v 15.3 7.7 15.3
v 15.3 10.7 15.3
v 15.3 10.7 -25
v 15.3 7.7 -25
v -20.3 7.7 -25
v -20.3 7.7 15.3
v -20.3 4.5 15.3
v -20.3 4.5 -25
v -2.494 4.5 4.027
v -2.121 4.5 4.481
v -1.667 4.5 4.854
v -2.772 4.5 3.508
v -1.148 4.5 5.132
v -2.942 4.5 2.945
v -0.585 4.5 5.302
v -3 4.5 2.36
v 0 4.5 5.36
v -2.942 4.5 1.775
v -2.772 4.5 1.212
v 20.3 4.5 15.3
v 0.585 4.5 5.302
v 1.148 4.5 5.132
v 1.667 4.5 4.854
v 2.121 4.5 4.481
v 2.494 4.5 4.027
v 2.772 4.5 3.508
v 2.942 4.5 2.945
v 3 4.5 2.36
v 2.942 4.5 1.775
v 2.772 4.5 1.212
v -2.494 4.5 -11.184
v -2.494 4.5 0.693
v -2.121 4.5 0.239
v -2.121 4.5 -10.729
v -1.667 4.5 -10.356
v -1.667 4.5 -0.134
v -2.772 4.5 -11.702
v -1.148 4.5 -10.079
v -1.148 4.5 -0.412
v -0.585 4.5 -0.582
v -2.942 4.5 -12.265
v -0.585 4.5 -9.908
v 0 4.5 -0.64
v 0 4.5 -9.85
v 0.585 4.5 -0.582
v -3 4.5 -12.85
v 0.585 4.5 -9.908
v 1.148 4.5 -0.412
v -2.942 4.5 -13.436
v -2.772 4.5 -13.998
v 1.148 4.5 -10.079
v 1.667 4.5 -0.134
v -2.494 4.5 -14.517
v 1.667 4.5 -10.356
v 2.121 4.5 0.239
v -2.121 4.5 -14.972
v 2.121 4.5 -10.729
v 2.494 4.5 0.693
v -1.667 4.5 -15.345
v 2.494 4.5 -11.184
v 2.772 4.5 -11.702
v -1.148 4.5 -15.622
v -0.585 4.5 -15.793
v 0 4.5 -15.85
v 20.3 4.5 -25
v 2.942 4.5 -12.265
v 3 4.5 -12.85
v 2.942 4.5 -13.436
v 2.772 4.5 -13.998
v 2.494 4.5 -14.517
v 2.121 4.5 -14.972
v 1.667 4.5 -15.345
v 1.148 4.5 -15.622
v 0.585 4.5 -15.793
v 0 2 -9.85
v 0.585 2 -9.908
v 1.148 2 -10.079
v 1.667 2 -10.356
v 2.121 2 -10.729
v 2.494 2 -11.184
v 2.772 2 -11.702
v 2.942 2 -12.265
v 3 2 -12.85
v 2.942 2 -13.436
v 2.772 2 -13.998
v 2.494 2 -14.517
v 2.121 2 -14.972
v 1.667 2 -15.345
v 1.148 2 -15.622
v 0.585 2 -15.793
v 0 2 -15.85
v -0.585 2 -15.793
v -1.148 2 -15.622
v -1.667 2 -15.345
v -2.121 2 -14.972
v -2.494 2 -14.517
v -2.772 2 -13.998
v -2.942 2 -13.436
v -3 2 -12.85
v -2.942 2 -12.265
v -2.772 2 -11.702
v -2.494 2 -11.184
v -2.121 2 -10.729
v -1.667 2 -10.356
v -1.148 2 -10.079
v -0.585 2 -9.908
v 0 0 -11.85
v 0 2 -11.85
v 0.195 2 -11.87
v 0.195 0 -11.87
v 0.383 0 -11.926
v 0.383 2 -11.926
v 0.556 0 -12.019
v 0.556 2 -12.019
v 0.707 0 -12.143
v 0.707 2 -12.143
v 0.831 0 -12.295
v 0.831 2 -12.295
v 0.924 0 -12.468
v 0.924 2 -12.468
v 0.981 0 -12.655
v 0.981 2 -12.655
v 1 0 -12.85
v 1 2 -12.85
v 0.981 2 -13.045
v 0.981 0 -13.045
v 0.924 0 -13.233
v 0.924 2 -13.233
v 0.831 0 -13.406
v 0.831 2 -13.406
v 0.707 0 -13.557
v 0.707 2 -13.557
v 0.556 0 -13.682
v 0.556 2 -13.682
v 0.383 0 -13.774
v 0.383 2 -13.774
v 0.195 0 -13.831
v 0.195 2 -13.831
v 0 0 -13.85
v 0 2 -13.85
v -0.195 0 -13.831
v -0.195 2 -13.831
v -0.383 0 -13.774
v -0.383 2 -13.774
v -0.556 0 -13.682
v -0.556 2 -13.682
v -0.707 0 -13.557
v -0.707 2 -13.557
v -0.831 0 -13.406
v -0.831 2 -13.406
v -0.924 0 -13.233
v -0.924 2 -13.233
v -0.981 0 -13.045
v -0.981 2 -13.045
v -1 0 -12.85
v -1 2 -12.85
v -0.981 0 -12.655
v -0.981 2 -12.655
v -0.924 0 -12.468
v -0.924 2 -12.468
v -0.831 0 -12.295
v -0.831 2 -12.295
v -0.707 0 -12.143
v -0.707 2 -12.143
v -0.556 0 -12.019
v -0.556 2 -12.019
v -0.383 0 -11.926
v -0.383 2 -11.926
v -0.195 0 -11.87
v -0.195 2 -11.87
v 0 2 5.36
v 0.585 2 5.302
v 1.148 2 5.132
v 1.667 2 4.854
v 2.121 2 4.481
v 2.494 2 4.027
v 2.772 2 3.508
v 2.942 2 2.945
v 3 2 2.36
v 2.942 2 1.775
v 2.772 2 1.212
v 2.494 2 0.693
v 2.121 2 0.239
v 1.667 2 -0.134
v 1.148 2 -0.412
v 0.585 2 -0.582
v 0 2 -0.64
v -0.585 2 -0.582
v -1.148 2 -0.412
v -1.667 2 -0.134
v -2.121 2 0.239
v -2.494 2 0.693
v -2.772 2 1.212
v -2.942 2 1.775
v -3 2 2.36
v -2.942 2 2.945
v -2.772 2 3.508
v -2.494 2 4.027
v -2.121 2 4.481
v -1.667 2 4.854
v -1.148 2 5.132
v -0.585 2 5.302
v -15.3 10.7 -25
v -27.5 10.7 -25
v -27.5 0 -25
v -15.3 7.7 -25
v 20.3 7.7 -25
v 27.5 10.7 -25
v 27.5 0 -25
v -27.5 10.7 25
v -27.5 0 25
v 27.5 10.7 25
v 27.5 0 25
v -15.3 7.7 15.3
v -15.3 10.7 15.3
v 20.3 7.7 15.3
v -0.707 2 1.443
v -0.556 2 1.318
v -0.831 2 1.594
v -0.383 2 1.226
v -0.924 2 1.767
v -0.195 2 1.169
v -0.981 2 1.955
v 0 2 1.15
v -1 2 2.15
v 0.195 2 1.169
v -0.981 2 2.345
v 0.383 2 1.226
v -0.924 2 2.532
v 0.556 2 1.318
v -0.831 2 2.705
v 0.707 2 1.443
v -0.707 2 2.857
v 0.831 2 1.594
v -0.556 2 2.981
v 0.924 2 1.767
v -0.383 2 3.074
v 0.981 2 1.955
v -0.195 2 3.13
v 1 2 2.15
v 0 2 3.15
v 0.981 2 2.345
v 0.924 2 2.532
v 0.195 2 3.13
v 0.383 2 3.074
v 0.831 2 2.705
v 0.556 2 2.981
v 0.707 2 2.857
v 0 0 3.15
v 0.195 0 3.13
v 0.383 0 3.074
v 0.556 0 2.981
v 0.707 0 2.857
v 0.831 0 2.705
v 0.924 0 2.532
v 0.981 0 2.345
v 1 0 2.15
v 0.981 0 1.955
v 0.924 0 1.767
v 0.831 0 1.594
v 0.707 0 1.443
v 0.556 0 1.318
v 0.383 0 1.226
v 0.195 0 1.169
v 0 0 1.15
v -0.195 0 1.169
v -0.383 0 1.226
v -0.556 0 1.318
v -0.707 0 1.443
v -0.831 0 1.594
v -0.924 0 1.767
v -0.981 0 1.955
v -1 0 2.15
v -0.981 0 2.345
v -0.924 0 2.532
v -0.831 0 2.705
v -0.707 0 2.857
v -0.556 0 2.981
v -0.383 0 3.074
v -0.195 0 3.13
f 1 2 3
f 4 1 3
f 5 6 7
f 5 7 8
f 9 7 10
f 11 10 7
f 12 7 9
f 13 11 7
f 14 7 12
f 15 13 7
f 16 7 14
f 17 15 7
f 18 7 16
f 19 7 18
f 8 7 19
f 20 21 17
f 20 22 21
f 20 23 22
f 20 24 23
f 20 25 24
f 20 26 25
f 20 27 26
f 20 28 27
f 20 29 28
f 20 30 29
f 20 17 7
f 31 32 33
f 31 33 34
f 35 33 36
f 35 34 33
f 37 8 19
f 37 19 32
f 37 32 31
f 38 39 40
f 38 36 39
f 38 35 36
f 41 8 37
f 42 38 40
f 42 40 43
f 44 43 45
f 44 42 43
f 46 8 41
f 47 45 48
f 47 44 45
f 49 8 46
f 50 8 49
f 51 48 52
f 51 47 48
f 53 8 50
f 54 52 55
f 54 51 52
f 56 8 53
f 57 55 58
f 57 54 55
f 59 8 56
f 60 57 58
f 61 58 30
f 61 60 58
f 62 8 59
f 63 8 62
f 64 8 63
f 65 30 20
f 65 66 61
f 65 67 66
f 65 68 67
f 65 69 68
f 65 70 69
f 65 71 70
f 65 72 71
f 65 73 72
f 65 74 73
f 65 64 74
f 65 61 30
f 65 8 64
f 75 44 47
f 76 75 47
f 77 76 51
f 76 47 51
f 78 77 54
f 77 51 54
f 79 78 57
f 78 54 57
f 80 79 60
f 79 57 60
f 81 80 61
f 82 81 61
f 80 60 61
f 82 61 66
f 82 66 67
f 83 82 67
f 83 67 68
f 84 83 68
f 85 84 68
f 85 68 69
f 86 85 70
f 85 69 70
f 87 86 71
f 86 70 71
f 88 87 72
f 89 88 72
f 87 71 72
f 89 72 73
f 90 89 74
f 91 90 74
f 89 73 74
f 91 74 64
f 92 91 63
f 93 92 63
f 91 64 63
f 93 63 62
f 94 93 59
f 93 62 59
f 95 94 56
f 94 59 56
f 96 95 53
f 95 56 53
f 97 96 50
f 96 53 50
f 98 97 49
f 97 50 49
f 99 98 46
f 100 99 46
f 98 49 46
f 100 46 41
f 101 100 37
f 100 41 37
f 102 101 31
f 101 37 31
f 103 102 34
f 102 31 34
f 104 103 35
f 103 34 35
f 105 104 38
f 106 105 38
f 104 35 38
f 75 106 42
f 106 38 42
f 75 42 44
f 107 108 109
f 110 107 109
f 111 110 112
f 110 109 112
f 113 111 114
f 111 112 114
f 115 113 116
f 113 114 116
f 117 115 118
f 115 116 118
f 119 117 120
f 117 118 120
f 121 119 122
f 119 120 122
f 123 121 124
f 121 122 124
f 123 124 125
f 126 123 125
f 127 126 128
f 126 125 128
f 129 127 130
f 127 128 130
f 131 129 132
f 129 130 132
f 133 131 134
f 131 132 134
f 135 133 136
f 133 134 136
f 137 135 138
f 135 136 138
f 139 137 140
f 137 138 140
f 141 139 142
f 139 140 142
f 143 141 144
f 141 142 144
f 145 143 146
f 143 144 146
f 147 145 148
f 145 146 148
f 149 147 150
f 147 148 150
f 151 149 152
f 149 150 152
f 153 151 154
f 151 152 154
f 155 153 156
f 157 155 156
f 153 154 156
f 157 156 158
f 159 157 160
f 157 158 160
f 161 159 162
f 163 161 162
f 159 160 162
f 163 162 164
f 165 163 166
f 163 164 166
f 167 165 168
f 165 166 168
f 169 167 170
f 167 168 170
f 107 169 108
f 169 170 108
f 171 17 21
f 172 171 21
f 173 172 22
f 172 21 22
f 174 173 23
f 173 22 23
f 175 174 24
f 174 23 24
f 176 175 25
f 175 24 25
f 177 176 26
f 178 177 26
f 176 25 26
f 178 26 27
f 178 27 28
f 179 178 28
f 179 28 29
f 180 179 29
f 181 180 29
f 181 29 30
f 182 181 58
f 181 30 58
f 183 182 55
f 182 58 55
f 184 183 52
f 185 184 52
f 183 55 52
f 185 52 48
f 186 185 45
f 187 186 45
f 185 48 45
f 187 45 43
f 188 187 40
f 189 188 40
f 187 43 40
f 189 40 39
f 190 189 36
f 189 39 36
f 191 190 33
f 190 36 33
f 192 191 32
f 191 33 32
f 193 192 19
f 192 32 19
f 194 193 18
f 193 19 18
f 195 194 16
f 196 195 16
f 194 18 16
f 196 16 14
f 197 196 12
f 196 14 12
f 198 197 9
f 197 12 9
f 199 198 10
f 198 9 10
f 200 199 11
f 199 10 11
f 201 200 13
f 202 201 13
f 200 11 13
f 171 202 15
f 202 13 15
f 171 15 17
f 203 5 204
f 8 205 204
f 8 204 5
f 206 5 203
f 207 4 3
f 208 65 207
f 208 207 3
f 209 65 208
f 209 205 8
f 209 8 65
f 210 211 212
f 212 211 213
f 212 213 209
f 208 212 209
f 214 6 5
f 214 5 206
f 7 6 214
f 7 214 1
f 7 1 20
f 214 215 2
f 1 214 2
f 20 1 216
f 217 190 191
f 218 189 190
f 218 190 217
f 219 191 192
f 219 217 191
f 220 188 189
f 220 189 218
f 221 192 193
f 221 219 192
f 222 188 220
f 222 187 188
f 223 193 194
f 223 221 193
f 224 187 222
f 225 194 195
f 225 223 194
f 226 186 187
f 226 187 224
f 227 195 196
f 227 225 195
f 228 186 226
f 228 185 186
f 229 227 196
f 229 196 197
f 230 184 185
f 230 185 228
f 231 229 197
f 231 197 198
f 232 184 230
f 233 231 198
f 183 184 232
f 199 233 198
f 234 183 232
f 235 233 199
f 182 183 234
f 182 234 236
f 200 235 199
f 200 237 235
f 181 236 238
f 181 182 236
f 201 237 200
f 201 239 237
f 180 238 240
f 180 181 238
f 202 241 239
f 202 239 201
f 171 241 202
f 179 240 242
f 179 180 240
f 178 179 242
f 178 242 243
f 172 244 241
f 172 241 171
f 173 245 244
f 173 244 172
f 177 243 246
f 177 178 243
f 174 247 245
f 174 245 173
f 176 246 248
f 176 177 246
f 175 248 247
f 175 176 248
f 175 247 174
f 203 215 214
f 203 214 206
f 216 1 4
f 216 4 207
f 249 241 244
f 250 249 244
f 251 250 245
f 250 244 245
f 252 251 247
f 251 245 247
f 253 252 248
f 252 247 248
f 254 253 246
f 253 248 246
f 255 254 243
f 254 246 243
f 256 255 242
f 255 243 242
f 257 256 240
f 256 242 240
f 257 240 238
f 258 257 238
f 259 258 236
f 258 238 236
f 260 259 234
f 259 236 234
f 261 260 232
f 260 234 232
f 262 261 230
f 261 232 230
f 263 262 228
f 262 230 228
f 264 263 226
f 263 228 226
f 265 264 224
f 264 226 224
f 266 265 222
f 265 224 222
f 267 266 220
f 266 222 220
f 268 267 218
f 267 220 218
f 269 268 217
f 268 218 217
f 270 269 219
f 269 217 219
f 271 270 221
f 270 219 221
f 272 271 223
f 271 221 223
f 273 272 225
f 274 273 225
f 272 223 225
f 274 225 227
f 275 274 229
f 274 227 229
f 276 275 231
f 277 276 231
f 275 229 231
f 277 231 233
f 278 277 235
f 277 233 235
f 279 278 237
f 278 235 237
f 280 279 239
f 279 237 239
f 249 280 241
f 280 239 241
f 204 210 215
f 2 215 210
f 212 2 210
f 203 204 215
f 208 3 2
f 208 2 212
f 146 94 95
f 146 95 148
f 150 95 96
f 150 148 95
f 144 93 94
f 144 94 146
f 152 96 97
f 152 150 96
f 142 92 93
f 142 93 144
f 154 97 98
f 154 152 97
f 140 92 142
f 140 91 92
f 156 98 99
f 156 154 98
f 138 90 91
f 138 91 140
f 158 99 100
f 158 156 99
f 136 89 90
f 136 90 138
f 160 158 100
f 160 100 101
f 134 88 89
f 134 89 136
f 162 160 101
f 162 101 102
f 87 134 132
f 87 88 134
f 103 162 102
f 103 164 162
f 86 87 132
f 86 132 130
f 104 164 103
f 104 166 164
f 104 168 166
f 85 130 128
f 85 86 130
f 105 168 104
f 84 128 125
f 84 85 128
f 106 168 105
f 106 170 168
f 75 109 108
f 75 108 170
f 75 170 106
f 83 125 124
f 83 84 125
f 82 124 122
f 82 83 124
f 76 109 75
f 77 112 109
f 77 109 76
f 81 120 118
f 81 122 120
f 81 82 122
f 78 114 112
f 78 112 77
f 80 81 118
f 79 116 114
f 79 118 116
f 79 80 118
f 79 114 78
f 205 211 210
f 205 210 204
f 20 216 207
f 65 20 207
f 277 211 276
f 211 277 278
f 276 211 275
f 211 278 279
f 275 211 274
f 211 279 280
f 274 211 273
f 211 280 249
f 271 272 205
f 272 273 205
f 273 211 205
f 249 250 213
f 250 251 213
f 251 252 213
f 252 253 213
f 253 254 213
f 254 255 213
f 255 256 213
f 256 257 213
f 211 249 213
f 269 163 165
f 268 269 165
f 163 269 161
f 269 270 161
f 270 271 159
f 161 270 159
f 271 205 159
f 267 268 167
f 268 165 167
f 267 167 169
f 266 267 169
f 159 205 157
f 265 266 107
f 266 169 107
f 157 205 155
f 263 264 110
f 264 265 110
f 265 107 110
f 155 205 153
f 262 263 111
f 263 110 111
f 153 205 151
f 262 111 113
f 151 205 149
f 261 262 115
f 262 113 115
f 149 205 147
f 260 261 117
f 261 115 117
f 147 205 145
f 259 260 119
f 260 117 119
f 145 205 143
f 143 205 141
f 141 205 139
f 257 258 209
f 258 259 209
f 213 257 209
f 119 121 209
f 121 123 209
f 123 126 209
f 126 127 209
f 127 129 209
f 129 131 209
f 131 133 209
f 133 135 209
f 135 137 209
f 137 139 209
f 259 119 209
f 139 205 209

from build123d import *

# Parameters (mm, degrees)
SKETCH1_W           = 55
SKETCH1_H           = 50
BOSS_EXTRUDE1_DEPTH = 10.7
SKETCH2_W           = 30.6
SKETCH2_H           = 40.3
CUT_EXTRUDE2_DEPTH  = 3
SKETCH4_W           = 40.6
SKETCH4_H           = 40.3
CUT_EXTRUDE3_DEPTH  = 3.2
SKETCH13_R          = 3
CUT_EXTRUDE4_DEPTH  = 2.5
SKETCH14_R          = 1
CUT_EXTRUDE5_DEPTH  = 2


with BuildPart() as part:
    # Sketch1 → Boss-Extrude1 (new body)
    with BuildSketch(Plane(origin=(0, 0, 0), x_dir=(1, 0, 0), z_dir=(0, 1, 0))):
        Rectangle(SKETCH1_W, SKETCH1_H)
    extrude(amount=BOSS_EXTRUDE1_DEPTH)

    # Sketch2 → Cut-Extrude2 (cut)
    with BuildSketch(Plane(origin=(0, 10.7, 0), x_dir=(1, 0, 0), z_dir=(0, 1, 0))):
        with Locations((0, 4.85)):
            Rectangle(SKETCH2_W, SKETCH2_H)
    extrude(amount=-CUT_EXTRUDE2_DEPTH, mode=Mode.SUBTRACT)

    # Sketch4 → Cut-Extrude3 (cut)
    with BuildSketch(Plane(origin=(0, 7.7, 0), x_dir=(1, 0, 0), z_dir=(0, 1, 0))):
        with Locations((0, 4.85)):
            Rectangle(SKETCH4_W, SKETCH4_H)
    extrude(amount=-CUT_EXTRUDE3_DEPTH, mode=Mode.SUBTRACT)

    # Sketch13 → Cut-Extrude4 (cut)
    with BuildSketch(Plane(origin=(0, 4.5, 0), x_dir=(1, 0, 0), z_dir=(0, 1, 0))):
        with Locations(Location((0, 12.850318005, 0), (0, 0, 270))):
            Circle(SKETCH13_R)
        with Locations(Location((0, -2.359937211, 0), (0, 0, 270))):
            Circle(SKETCH13_R)
    extrude(amount=-CUT_EXTRUDE4_DEPTH, mode=Mode.SUBTRACT)

    # Sketch14 → Cut-Extrude5 (cut)
    with BuildSketch(Plane(origin=(0, 2, 0), x_dir=(1, 0, 0), z_dir=(0, 1, 0))):
        with Locations(Location((0, 12.850318005, 0), (0, 0, 270))):
            Circle(SKETCH14_R)
        with Locations(Location((0, -2.149681995, 0), (0, 0, 270))):
            Circle(SKETCH14_R)
    extrude(amount=-CUT_EXTRUDE5_DEPTH, mode=Mode.SUBTRACT)


solid = part.part
